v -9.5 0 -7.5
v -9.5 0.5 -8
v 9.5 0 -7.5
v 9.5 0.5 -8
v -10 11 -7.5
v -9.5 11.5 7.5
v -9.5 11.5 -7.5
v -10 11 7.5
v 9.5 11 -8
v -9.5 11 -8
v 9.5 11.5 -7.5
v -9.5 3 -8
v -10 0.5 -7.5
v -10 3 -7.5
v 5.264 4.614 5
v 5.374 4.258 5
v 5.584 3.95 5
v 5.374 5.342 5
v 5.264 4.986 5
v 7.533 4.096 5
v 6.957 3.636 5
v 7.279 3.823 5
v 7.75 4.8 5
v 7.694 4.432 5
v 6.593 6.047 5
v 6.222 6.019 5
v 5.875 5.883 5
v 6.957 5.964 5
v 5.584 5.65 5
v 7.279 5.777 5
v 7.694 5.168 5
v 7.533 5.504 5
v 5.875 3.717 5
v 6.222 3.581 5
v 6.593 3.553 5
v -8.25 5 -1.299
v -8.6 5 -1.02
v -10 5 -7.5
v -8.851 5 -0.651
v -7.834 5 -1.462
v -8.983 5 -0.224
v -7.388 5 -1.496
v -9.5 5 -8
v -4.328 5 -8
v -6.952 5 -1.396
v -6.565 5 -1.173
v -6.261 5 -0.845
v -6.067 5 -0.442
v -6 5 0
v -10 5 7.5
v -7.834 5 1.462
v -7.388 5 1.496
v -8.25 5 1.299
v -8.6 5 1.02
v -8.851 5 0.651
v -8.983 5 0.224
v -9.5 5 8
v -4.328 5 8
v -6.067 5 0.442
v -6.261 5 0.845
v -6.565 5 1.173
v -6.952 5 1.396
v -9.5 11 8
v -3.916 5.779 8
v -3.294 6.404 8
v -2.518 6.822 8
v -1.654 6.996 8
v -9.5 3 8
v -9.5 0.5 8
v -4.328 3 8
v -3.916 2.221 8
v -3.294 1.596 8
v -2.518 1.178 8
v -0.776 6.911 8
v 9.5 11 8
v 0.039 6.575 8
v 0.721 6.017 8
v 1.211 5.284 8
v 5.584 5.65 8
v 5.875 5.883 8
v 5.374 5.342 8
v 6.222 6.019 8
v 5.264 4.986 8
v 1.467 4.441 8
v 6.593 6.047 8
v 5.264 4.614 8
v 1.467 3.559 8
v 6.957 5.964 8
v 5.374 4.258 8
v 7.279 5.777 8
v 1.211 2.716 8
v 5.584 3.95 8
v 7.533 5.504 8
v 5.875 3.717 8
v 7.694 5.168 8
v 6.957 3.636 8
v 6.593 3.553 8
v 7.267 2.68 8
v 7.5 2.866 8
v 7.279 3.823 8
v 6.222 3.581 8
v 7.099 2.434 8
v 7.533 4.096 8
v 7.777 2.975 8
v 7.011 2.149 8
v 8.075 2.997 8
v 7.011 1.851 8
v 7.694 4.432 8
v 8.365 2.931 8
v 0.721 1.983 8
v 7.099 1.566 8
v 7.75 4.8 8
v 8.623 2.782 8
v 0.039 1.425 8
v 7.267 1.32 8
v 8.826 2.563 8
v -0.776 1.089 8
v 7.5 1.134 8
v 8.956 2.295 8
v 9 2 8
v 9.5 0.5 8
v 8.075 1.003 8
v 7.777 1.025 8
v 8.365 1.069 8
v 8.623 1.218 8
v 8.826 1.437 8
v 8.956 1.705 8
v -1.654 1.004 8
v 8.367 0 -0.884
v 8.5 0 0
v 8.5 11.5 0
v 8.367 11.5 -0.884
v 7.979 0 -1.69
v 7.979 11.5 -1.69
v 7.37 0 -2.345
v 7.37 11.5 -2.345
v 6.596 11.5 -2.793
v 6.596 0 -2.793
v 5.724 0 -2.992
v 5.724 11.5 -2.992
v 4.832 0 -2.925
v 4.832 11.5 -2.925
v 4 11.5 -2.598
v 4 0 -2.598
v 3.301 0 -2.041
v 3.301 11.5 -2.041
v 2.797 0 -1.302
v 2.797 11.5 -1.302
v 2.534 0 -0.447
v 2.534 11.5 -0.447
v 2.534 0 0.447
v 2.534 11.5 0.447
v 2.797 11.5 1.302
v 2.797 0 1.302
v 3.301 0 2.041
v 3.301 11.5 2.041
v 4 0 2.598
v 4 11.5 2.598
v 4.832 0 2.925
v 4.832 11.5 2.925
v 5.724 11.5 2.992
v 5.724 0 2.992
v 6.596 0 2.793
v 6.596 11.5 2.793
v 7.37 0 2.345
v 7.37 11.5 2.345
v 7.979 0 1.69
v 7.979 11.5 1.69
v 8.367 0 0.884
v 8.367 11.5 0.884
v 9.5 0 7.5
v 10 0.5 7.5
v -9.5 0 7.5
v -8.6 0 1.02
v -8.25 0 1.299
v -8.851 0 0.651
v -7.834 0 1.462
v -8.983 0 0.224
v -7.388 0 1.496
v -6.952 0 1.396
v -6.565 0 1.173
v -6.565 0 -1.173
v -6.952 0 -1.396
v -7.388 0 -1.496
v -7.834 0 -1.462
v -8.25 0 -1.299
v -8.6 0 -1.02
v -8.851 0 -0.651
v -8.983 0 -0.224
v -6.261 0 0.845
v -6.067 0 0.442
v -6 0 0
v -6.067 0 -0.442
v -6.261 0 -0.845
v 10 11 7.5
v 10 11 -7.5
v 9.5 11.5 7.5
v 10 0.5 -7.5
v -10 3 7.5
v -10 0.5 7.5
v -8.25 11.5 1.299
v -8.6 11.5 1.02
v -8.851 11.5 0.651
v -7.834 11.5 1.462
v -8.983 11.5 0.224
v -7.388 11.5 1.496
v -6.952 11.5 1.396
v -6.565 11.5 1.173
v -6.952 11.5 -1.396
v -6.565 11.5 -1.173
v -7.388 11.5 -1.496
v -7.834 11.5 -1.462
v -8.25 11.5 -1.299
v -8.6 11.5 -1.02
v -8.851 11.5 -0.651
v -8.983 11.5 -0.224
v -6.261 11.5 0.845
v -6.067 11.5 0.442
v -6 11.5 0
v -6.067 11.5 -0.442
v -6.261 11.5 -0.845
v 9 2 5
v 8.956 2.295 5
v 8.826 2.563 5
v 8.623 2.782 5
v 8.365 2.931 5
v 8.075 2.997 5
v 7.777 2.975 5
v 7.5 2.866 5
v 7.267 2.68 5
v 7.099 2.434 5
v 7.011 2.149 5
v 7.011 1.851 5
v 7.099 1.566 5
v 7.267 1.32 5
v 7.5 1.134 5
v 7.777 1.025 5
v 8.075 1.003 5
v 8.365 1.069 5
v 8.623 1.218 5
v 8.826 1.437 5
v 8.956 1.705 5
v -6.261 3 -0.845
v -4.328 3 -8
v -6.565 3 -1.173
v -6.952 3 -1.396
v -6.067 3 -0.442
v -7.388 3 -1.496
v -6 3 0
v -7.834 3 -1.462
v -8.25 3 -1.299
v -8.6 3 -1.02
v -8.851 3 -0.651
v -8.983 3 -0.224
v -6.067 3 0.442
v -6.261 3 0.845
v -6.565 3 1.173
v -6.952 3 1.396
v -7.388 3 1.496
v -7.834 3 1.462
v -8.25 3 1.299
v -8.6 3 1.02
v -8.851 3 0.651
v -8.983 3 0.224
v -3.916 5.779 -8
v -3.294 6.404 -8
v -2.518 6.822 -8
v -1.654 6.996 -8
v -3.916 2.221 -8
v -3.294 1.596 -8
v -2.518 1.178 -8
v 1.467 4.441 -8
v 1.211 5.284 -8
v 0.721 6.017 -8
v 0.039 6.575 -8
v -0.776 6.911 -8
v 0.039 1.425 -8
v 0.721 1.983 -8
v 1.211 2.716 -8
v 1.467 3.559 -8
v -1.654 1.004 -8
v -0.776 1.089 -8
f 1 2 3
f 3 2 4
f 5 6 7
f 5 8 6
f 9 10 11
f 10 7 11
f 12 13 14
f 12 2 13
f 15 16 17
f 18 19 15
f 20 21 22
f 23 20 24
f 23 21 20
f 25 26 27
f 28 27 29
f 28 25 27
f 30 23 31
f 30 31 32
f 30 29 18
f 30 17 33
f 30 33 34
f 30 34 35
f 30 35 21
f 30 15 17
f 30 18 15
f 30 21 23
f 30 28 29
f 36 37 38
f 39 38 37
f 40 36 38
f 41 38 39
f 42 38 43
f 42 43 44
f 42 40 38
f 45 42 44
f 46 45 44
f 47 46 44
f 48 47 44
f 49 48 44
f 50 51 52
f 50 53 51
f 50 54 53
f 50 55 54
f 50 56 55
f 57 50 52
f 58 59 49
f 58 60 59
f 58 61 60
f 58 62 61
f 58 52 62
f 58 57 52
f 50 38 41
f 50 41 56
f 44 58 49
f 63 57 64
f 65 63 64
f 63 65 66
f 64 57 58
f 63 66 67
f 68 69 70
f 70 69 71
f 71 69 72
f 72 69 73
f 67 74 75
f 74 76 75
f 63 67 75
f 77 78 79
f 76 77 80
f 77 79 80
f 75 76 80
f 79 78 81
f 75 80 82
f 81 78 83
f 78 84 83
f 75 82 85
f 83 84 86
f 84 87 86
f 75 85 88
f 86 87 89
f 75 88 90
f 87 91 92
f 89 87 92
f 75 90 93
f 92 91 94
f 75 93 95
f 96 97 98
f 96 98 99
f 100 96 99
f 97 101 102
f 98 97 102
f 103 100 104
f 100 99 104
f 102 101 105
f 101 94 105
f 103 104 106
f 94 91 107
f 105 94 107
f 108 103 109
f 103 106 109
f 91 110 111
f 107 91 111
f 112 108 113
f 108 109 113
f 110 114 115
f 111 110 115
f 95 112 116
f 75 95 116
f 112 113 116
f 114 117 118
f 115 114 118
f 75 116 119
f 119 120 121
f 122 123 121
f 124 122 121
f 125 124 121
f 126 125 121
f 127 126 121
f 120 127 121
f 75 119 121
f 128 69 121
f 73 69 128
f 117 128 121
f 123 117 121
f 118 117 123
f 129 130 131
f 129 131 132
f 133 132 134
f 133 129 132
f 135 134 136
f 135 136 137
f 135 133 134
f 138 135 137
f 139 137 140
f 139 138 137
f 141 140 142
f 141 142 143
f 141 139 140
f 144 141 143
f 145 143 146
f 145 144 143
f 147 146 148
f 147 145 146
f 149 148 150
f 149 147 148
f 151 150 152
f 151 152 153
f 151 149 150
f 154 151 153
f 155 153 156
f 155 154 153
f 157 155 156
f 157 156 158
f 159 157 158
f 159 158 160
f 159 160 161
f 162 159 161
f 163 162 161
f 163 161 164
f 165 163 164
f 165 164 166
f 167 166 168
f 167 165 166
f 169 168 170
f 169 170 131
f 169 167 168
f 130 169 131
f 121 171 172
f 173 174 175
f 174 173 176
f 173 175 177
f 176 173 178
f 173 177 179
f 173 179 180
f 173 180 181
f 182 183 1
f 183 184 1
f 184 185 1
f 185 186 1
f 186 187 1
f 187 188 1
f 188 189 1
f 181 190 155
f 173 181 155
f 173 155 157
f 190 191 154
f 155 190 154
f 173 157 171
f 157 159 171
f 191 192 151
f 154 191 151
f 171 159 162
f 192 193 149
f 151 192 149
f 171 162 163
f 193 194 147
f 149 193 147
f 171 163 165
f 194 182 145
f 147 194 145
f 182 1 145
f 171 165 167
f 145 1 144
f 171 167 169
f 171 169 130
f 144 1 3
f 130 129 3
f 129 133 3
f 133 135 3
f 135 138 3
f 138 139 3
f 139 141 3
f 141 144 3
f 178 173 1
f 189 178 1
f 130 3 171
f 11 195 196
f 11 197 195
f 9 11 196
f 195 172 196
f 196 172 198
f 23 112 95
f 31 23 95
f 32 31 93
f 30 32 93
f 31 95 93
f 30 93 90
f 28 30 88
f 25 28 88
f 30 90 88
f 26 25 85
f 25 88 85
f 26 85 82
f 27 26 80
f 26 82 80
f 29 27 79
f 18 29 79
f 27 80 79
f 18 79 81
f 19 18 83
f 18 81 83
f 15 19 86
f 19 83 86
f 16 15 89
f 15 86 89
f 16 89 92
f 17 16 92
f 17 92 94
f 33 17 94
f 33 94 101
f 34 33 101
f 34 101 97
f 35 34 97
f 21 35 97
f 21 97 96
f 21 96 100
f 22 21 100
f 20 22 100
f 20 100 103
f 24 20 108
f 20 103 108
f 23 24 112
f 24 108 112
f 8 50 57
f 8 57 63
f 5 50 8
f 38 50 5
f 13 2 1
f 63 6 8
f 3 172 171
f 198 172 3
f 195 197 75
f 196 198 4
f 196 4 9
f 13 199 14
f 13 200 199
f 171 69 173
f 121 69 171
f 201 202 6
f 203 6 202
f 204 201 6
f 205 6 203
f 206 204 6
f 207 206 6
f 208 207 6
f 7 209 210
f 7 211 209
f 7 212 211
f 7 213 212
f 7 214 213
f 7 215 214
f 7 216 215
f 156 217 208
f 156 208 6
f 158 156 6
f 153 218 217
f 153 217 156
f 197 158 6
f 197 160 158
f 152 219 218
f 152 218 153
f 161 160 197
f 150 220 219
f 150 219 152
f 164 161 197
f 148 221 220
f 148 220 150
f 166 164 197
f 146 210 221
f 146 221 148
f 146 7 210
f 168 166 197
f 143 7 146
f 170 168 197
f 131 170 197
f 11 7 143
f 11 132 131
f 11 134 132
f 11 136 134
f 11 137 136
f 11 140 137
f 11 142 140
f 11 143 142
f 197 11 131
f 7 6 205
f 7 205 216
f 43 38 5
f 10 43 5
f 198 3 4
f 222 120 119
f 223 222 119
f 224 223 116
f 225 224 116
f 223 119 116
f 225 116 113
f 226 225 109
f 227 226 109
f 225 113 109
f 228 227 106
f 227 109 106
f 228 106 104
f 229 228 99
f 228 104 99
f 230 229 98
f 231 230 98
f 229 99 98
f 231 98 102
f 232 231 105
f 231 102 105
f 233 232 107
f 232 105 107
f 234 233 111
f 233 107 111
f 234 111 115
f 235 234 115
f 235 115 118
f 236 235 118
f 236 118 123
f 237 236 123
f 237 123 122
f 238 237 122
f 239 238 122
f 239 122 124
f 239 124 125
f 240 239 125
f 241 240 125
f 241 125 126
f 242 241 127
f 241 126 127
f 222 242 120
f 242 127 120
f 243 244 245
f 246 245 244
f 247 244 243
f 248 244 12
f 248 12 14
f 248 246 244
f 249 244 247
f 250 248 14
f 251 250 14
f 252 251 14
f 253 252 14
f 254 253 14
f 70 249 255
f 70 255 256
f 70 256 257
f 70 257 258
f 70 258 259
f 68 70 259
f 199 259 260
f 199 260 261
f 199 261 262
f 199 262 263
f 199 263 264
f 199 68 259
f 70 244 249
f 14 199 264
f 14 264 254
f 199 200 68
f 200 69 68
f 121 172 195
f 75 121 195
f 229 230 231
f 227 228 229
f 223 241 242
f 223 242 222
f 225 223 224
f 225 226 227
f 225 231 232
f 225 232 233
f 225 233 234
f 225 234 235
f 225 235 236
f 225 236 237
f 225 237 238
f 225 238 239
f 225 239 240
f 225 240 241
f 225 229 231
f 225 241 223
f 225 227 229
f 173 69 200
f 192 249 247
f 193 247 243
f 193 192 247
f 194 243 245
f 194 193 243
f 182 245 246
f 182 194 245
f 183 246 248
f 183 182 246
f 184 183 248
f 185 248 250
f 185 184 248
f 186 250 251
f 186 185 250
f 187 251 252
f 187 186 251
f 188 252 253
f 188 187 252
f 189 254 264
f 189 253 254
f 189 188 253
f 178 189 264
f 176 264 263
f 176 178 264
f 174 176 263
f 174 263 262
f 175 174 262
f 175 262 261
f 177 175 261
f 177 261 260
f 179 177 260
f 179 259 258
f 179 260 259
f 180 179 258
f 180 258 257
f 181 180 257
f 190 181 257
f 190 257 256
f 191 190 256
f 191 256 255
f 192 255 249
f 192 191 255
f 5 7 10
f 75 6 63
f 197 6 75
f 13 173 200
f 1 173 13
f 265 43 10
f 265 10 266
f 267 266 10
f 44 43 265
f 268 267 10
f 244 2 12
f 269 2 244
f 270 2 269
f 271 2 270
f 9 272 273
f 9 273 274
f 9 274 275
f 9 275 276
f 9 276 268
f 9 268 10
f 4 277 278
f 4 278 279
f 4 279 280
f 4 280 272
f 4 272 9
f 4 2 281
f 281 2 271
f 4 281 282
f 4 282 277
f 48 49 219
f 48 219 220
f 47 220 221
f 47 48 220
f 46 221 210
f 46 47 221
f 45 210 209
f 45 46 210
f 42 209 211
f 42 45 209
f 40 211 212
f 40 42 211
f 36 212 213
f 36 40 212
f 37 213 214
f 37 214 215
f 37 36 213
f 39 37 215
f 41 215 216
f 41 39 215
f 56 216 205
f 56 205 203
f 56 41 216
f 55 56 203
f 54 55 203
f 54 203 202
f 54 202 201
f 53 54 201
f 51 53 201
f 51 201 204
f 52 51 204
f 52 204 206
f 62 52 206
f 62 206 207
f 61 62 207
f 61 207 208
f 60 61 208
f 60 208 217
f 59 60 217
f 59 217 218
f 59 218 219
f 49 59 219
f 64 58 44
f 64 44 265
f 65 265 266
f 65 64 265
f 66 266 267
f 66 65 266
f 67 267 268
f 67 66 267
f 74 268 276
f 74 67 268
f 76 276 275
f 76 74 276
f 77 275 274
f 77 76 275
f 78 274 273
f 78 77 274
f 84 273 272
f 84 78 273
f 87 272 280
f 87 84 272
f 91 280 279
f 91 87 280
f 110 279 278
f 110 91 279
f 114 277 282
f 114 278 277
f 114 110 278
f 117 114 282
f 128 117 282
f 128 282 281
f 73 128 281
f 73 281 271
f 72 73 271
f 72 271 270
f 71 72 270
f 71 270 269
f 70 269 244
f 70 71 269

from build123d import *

# Parameters (mm, degrees)
SKETCH1_W           = 20
SKETCH1_H           = 16
SKETCH1_R           = 3
SKETCH1_R_2         = 1.5
BOSS_EXTRUDE1_DEPTH = 11.5
CUT_EXTRUDE1_DEPTH  = 17
SKETCH3_R           = 1.25
SKETCH3_R_2         = 1
CUT_EXTRUDE2_DEPTH  = 3
CHAMFER1_SIZE       = 0.5


with BuildPart() as part:
    # Sketch1 → Boss-Extrude1 (new body)
    with BuildSketch(Plane(origin=(0, 0, 0), x_dir=(1, 0, 0), z_dir=(0, 1, 0))):
        Rectangle(SKETCH1_W, SKETCH1_H)
        with Locations((5.5, 0)):
            Circle(SKETCH1_R, mode=Mode.SUBTRACT)
        with Locations((-7.5, 0)):
            Circle(SKETCH1_R_2, mode=Mode.SUBTRACT)
    extrude(amount=BOSS_EXTRUDE1_DEPTH)

    # Sketch2 → Cut-Extrude1 (cut, through all)
    with BuildSketch(Plane.XY.offset(8)):
        with BuildLine():
            Line((-10, 5), (-4.328427125, 5))
            ThreePointArc((-4.328427125, 5), (1.5, 4), (-4.328427125, 3))
            Line((-4.328427125, 3), (-10, 3))
            Line((-10, 3), (-10, 5))
        make_face()
    extrude(amount=-CUT_EXTRUDE1_DEPTH, mode=Mode.SUBTRACT)

    # Sketch3 → Cut-Extrude2 (cut)
    with BuildSketch(Plane.XY.offset(8)):
        with Locations((6.5, 4.8)):
            Circle(SKETCH3_R)
        with Locations((8, 2)):
            Circle(SKETCH3_R_2)
    extrude(amount=-CUT_EXTRUDE2_DEPTH, mode=Mode.SUBTRACT)

    # Chamfer1
    chamfer1_edges = [part.edges().sort_by_distance(p)[0] for p in [
        (10, 11.5, 0),
        (0, 11.5, -8),
        (-10, 1.5, -8),
        (-10, 1.5, 8),
        (-10, 11.5, 0),
        (0, 0, -8),
        (10, 0, 0),
        (0, 0, 8),
        (-10, 0, 0),
        (0, 11.5, 8),
        (-10, 8.25, -8),
        (10, 5.75, -8),
        (10, 5.75, 8),
        (-10, 8.25, 8),
    ]]
    chamfer(chamfer1_edges, length=CHAMFER1_SIZE)


solid = part.part
